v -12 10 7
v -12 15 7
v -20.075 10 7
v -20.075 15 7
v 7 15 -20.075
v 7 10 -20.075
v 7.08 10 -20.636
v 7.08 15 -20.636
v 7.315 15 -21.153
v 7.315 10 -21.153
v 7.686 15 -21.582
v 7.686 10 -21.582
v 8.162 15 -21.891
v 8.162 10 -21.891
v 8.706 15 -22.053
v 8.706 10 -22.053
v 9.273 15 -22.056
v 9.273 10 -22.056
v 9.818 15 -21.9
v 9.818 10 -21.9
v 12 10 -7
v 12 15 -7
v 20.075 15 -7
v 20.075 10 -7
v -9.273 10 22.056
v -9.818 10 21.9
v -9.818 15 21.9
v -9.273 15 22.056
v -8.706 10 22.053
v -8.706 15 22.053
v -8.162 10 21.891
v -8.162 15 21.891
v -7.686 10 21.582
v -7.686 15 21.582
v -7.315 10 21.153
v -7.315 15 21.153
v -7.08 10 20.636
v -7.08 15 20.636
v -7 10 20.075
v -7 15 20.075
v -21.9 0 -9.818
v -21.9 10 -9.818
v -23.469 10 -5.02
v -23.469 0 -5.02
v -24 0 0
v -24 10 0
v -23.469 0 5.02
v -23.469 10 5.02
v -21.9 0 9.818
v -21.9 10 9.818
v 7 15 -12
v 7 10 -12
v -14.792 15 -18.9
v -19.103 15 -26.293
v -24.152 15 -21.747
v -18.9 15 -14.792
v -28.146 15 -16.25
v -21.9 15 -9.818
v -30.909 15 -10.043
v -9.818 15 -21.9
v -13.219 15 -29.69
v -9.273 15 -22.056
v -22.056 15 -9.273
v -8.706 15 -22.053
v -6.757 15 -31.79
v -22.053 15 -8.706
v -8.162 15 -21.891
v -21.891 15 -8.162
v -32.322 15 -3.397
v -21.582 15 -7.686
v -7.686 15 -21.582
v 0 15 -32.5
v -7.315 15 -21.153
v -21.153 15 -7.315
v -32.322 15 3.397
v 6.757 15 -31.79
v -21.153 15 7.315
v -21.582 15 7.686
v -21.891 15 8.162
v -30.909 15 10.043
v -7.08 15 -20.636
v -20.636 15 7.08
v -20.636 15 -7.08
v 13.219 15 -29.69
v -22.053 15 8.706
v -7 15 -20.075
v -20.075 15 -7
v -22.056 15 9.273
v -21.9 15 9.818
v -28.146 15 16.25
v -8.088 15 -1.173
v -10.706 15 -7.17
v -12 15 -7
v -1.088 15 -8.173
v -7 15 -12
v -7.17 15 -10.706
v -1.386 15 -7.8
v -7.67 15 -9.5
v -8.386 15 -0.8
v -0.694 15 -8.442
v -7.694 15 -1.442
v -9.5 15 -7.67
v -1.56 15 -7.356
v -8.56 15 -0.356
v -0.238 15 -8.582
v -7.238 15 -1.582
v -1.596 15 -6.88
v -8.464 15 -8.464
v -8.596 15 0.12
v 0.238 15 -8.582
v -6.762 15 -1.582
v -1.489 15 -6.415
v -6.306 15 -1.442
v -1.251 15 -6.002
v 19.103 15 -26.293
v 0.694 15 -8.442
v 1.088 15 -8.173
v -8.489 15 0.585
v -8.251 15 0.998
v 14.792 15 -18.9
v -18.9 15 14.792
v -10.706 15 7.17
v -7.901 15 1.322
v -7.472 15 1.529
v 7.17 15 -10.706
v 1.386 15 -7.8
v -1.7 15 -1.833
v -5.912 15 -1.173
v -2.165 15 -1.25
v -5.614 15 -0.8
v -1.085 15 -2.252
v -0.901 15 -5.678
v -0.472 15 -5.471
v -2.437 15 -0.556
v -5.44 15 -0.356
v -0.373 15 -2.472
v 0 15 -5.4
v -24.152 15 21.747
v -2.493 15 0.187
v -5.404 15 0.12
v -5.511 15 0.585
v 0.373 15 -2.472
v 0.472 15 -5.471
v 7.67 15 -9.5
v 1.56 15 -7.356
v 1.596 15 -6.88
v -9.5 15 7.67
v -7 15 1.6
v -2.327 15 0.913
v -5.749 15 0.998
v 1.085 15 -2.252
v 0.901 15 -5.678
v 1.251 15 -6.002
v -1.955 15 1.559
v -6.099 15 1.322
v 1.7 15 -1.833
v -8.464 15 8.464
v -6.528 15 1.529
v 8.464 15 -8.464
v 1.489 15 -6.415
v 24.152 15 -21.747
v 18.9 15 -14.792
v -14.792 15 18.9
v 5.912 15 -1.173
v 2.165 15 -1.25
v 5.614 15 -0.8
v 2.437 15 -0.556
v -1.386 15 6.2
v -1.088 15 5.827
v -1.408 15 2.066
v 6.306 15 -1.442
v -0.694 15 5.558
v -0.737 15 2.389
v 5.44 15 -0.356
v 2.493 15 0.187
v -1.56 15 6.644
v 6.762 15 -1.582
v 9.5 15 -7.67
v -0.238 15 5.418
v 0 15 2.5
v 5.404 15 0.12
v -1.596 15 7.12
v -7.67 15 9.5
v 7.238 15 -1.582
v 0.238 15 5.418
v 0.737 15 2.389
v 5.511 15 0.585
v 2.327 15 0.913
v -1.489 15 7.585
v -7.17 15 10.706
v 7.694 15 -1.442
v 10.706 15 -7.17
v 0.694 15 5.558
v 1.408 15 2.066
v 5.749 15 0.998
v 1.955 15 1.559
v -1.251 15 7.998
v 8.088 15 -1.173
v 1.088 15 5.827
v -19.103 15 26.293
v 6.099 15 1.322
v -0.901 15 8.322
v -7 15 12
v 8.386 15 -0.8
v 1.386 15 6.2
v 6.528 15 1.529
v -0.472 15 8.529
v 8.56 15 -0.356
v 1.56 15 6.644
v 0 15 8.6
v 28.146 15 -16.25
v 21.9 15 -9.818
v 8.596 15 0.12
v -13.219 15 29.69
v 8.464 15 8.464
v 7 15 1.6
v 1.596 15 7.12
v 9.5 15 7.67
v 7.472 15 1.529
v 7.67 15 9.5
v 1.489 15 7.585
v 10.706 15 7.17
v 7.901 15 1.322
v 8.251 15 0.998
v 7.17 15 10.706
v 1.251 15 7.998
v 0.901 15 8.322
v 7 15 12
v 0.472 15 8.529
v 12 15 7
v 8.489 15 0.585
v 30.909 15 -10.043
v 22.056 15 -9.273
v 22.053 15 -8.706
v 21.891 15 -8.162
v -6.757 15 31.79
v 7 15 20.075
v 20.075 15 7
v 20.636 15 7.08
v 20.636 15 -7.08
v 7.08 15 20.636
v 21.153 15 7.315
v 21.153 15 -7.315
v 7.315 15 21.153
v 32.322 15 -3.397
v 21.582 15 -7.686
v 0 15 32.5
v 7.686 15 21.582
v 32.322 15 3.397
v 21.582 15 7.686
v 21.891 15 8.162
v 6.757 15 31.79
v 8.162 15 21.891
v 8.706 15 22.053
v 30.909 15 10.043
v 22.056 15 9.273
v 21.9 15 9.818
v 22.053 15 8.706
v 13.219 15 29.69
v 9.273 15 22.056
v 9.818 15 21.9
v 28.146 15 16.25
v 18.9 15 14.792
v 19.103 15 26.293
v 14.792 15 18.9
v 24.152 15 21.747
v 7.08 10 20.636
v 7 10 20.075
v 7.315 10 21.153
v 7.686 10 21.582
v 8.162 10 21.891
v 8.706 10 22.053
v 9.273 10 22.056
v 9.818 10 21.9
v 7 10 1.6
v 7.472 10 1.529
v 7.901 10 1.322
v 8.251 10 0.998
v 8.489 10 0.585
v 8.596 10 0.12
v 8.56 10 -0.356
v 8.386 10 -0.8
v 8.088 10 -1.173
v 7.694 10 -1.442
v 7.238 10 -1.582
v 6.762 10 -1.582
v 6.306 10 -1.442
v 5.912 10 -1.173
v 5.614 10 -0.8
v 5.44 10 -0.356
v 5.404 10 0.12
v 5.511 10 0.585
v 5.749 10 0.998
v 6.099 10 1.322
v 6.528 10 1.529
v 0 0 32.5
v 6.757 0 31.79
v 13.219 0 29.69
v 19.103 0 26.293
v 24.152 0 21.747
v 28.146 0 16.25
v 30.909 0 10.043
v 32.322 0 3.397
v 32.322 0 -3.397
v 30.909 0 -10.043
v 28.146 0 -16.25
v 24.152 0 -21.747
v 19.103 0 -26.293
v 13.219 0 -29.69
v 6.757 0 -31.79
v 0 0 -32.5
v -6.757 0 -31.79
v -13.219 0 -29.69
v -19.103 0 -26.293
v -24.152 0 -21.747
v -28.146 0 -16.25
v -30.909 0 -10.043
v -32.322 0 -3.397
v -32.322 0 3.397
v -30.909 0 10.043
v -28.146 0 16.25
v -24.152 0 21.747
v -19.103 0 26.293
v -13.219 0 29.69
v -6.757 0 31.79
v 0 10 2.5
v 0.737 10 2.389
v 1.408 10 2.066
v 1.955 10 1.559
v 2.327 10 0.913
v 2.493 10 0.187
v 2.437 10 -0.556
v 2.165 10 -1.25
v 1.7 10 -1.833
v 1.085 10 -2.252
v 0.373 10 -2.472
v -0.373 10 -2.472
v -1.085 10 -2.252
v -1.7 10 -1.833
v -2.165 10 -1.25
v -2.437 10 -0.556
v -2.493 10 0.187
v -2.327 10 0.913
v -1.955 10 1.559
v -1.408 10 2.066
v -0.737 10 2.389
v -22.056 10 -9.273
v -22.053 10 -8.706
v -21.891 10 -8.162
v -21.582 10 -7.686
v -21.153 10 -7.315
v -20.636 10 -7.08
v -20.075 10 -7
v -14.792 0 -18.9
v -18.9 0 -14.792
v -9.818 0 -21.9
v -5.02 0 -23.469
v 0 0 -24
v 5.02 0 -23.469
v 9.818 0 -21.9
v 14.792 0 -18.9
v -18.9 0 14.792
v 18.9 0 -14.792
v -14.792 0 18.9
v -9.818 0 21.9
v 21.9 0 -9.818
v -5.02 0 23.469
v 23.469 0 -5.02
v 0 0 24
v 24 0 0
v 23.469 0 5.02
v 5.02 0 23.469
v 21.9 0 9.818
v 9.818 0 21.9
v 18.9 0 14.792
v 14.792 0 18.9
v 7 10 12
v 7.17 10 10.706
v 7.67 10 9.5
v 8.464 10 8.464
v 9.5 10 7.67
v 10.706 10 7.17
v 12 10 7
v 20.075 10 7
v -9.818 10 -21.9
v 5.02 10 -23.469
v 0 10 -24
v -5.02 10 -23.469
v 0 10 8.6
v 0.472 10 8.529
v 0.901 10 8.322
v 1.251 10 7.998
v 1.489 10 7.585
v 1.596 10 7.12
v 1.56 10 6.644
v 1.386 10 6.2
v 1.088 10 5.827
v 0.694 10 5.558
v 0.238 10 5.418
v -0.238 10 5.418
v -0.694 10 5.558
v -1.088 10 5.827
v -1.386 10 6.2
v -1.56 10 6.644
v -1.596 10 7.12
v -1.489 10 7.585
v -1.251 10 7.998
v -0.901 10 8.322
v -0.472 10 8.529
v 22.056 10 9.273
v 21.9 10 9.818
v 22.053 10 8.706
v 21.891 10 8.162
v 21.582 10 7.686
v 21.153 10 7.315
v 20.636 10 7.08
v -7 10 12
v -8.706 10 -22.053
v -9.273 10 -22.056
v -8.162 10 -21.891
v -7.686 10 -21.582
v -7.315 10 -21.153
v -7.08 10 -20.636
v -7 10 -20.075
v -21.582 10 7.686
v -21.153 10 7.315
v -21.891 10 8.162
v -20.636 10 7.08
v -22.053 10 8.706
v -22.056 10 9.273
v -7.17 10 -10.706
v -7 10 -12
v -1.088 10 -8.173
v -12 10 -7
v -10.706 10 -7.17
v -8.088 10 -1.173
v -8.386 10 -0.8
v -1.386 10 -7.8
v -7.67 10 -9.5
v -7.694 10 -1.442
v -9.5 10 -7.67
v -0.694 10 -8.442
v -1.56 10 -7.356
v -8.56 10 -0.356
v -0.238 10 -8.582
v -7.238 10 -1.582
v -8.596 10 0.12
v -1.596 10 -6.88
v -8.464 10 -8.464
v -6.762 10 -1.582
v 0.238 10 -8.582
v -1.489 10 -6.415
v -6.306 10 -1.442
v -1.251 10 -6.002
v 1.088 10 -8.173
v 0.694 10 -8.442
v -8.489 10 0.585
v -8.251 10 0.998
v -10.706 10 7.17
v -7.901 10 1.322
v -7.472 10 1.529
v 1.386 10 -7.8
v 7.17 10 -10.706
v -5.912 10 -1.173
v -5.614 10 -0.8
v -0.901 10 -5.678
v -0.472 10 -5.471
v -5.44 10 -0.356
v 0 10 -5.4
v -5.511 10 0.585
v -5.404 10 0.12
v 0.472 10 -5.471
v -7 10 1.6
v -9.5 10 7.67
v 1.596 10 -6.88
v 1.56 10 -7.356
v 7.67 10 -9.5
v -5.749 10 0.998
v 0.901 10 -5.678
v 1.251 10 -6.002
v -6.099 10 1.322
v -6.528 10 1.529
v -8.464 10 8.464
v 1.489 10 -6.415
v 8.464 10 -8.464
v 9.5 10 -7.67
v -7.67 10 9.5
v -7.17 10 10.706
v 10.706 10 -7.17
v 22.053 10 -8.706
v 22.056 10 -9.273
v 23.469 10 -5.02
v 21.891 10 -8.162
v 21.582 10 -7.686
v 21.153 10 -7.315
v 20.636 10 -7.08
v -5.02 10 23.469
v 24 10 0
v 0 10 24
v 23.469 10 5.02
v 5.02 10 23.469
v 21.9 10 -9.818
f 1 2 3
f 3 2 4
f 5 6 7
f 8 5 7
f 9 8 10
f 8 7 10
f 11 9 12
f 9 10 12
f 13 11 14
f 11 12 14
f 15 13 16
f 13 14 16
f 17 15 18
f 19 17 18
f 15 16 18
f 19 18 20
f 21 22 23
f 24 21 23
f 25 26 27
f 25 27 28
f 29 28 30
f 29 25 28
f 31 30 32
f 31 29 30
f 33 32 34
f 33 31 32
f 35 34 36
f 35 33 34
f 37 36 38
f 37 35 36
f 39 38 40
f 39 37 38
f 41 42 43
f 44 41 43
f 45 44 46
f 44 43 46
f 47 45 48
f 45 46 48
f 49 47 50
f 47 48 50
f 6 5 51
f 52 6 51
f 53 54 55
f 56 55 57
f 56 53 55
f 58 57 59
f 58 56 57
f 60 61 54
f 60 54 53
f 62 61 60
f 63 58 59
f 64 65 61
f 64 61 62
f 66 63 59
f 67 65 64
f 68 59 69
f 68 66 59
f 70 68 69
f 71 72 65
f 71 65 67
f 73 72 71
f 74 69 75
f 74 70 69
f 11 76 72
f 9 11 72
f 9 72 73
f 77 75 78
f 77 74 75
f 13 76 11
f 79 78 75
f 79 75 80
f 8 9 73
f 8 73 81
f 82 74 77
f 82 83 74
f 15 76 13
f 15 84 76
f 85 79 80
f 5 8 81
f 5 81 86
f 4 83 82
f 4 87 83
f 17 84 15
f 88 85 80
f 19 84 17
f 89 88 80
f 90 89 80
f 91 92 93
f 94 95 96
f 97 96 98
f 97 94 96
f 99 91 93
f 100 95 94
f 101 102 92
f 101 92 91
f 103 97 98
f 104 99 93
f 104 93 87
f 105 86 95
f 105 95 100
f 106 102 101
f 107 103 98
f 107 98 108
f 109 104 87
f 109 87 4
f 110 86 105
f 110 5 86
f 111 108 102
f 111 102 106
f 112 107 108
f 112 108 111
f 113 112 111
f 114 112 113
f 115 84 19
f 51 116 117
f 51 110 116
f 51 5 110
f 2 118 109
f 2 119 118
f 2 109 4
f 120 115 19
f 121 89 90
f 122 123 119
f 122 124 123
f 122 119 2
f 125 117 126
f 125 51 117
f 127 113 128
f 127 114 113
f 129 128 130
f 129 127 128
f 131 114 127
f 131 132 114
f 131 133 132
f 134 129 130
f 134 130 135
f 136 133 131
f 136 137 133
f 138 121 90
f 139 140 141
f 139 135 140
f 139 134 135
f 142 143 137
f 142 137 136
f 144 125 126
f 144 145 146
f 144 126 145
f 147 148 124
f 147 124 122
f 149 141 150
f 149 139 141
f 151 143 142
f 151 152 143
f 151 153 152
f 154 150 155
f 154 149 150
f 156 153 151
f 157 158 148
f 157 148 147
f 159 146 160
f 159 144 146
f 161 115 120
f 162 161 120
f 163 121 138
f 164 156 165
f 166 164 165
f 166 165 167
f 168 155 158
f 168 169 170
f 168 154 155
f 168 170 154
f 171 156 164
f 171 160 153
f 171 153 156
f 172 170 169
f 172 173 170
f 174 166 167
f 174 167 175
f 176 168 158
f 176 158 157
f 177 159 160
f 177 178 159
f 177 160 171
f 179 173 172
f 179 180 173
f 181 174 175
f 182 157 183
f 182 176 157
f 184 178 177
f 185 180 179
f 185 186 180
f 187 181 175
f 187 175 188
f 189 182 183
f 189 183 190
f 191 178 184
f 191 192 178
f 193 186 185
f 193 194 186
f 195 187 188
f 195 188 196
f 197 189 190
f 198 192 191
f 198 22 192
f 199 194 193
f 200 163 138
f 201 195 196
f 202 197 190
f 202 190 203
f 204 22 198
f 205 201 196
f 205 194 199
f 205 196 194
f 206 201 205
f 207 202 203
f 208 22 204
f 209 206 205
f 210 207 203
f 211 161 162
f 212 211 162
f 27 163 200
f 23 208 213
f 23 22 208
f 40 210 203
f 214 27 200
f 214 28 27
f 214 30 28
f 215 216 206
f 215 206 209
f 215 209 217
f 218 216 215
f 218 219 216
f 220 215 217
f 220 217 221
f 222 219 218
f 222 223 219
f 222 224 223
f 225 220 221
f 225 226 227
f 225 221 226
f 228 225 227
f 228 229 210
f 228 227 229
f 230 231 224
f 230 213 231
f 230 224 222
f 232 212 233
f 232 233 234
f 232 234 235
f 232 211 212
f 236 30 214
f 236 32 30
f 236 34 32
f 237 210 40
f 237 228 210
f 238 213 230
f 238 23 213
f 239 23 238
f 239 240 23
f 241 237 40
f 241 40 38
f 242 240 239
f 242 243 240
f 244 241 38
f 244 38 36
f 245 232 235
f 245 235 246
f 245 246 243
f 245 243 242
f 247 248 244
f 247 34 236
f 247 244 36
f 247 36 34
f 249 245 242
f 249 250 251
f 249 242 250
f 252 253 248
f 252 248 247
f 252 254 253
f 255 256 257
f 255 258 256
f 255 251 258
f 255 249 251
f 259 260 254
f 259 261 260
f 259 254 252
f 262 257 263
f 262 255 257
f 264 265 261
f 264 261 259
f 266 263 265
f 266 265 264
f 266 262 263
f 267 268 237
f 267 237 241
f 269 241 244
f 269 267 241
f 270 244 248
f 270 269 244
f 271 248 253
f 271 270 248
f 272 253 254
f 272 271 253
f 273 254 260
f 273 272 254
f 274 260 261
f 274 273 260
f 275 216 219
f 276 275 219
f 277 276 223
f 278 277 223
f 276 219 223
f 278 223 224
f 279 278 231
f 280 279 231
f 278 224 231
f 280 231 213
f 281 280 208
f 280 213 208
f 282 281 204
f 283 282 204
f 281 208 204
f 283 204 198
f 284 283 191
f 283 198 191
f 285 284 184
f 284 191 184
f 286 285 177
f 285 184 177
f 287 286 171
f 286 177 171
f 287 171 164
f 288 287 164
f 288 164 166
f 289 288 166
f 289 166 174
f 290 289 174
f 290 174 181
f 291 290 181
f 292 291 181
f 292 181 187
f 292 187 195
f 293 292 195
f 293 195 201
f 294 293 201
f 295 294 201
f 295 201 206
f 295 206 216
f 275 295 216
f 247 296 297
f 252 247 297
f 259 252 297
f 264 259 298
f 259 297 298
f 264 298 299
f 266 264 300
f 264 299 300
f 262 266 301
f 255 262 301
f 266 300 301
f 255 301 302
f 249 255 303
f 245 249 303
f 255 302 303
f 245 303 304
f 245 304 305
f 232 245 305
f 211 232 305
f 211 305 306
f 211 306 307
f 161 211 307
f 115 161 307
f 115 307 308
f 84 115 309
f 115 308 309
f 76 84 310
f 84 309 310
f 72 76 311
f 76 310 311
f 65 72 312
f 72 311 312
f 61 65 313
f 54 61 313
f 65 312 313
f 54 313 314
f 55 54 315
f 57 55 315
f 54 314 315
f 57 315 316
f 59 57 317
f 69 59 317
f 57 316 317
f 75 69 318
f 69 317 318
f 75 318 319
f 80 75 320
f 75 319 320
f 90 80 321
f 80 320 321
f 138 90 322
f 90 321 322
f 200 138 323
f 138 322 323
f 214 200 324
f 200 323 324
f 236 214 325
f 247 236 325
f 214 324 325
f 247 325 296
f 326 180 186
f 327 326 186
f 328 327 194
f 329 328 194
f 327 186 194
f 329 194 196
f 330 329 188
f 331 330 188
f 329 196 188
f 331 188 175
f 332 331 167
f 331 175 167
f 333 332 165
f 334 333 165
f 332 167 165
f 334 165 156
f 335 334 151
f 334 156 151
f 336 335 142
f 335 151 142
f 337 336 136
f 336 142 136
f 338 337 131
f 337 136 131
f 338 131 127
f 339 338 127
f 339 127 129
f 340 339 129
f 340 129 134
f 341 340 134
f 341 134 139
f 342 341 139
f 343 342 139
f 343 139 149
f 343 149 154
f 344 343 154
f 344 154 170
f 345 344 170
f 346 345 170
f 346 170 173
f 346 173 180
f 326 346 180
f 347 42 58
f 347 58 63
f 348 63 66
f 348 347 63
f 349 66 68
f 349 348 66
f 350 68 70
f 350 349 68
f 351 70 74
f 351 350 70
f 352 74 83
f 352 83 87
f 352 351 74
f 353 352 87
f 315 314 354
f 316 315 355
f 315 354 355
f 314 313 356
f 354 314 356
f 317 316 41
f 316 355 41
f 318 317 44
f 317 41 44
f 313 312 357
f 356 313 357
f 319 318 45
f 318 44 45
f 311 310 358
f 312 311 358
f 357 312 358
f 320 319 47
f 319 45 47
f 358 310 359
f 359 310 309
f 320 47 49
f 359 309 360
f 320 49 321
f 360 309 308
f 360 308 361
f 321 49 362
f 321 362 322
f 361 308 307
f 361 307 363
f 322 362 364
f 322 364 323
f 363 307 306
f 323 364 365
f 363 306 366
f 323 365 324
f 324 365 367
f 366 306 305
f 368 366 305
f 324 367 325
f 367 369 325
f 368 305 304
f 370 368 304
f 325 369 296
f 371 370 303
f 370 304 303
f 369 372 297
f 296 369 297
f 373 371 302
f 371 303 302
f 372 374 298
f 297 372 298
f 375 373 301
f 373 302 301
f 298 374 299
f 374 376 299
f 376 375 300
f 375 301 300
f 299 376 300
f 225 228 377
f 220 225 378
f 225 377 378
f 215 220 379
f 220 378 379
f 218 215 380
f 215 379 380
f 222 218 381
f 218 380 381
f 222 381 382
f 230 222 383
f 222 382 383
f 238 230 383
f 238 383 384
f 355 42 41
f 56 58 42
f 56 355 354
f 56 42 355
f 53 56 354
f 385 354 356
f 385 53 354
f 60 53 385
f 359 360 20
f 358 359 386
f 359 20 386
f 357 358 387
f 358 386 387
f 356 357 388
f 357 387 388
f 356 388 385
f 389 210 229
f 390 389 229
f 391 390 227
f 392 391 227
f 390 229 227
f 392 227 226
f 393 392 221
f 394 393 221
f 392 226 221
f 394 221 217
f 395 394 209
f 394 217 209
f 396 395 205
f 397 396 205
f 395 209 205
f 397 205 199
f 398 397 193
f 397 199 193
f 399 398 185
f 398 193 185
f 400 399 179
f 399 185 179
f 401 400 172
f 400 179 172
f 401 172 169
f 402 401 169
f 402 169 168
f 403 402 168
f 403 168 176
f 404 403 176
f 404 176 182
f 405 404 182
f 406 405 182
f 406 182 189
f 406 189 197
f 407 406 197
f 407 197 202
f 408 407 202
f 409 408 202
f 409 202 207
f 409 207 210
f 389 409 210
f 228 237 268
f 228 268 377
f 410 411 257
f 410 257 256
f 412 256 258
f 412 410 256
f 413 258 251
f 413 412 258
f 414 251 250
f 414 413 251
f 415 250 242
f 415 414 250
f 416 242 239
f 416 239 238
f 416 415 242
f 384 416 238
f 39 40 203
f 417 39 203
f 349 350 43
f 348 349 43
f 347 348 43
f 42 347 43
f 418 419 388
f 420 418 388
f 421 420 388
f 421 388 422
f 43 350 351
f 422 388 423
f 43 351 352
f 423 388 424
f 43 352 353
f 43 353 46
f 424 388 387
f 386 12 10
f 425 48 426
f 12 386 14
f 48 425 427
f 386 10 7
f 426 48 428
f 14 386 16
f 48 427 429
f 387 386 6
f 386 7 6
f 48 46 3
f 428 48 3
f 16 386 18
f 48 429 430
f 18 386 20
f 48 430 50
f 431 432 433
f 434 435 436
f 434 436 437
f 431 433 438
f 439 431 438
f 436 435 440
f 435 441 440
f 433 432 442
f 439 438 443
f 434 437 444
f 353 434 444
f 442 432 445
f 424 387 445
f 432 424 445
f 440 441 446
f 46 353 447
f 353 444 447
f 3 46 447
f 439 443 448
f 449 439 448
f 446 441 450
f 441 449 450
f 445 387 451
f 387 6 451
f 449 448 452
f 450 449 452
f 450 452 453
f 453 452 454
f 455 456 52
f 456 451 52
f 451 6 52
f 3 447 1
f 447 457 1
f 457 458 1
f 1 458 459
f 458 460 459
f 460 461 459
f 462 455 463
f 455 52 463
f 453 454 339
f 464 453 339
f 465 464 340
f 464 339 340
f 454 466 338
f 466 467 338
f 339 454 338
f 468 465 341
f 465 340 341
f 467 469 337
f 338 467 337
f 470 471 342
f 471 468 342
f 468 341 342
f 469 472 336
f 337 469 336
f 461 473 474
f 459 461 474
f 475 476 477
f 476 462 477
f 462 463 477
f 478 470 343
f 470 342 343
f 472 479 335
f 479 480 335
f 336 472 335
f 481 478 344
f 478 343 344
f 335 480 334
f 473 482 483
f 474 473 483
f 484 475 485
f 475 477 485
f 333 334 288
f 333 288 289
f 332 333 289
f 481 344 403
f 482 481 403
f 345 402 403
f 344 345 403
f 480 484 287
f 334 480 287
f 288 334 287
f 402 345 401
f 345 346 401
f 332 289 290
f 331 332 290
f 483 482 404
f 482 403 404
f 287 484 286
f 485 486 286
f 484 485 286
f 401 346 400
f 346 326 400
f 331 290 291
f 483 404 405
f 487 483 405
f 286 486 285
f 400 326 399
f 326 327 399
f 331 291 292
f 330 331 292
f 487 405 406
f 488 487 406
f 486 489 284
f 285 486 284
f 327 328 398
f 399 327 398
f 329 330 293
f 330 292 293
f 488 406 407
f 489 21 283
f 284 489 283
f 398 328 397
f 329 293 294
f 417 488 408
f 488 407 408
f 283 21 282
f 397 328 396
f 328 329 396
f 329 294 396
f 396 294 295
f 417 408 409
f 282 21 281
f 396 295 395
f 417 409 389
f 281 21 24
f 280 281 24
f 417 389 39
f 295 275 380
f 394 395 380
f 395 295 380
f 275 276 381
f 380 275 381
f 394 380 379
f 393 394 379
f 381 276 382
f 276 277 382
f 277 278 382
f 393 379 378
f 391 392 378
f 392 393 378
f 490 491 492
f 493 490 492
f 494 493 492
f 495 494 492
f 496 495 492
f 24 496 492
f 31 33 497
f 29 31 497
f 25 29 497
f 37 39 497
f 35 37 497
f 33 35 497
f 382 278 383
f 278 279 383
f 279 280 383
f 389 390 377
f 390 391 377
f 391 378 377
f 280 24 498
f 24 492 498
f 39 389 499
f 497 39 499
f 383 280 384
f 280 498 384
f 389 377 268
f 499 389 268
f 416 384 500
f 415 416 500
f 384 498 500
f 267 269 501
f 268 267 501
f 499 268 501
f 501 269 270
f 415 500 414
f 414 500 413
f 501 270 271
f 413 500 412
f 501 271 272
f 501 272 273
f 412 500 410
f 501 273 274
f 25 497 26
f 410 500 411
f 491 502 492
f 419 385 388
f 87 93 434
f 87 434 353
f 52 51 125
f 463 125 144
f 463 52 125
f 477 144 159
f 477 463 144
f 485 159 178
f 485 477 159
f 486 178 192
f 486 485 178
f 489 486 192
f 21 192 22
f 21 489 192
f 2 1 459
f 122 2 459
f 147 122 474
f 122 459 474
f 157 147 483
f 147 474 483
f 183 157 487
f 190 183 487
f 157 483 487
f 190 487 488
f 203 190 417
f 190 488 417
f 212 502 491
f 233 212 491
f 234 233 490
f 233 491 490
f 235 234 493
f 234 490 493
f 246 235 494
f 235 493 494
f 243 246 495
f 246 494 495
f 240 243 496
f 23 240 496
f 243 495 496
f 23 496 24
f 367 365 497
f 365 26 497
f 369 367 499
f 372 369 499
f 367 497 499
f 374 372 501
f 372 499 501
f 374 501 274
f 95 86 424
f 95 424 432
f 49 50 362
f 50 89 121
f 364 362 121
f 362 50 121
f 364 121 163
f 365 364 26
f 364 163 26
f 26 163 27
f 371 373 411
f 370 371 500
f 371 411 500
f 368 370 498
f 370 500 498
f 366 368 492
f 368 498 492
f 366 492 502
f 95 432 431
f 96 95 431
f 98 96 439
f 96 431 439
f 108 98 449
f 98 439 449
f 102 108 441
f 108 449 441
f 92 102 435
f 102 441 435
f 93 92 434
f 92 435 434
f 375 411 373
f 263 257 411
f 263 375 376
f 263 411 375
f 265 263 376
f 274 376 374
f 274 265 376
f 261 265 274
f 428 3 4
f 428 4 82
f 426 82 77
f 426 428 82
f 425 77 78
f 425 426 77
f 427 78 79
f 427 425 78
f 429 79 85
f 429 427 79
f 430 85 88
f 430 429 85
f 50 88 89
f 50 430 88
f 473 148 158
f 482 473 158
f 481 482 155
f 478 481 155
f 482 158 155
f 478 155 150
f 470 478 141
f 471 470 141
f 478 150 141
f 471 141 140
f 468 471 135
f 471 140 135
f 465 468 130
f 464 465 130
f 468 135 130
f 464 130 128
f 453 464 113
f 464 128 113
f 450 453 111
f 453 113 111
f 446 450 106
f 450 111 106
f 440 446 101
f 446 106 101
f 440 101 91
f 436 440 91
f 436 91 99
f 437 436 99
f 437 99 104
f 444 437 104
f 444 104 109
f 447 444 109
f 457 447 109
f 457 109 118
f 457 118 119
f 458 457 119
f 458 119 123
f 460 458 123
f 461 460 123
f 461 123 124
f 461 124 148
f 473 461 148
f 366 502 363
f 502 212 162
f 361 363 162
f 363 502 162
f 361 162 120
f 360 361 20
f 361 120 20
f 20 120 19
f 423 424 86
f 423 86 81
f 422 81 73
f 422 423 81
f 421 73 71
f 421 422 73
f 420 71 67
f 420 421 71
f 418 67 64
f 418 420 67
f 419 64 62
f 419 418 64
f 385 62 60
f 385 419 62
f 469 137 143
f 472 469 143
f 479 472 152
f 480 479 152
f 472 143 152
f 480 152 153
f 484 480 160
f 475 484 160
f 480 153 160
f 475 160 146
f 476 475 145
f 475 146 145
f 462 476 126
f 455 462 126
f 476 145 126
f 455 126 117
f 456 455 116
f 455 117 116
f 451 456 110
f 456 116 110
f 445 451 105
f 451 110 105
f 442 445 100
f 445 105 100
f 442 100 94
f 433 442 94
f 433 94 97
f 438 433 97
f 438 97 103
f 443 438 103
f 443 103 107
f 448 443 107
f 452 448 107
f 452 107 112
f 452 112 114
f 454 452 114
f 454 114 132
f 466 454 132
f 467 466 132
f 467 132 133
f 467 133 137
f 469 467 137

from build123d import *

# Parameters (mm, degrees)
SKETCH_1_R          = 32.5
EXTRUDE_1_DEPTH     = 15
SKETCH_2_R          = 1.6
CUT_EXTRUDE_1_DEPTH = 27
CUT_EXTRUDE_2_DEPTH = 15
FILLET_1_R          = 5
FILLET_2_R          = 2
CUT_EXTRUDE_START   = 10
SKETCH_4_R          = 24
CUT_EXTRUDE_3_DEPTH = 10
SKETCH_5_R          = 2.5
CUT_EXTRUDE_4_DEPTH = 10


with BuildPart() as part:
    # 草图1 → 凸台-拉伸1 (new body)
    with BuildSketch(Plane(origin=(0, 0, 0), x_dir=(1, 0, 0), z_dir=(0, 1, 0))):
        with Locations(Location((0, 0, 0), (0, 0, 270))):
            Circle(SKETCH_1_R)
    extrude(amount=EXTRUDE_1_DEPTH)

    # 草图2 → 切除-拉伸1 (cut)
    with BuildSketch(Plane(origin=(0, 15, 0), x_dir=(1, 0, 0), z_dir=(0, 1, 0))):
        with Locations(Location((7, 0, 0), (0, 0, 270))):
            Circle(SKETCH_2_R)
        with Locations(Location((0, -7, 0), (0, 0, 270))):
            Circle(SKETCH_2_R)
        with Locations(Location((-7, 0, 0), (0, 0, 270))):
            Circle(SKETCH_2_R)
        with Locations(Location((0, 7, 0), (0, 0, 270))):
            Circle(SKETCH_2_R)
    extrude(amount=-CUT_EXTRUDE_1_DEPTH, mode=Mode.SUBTRACT)

    # 草图3 → 切除-拉伸2 (cut)
    with BuildSketch(Plane(origin=(0, 15, 0), x_dir=(1, 0, 0), z_dir=(0, 1, 0))):
        with BuildLine():
            Line((7, 22.956480566), (7, 7))
            Line((7, 7), (22.956480566, 7))
            ThreePointArc((22.956480566, 7), (16.970562748, 16.970562748), (7, 22.956480566))
        make_face()
        with BuildLine():
            Line((-7, 7), (-22.956480566, 7))
            ThreePointArc((-22.956480566, 7), (-16.970562748, 16.970562748), (-7, 22.956480566))
            Line((-7, 22.956480566), (-7, 7))
        make_face()
        with BuildLine():
            Line((7, -7), (22.956480566, -7))
            ThreePointArc((22.956480566, -7), (16.970562748, -16.970562748), (7, -22.956480566))
            Line((7, -22.956480566), (7, -7))
        make_face()
        with BuildLine():
            Line((-7, -7), (-22.956480566, -7))
            ThreePointArc((-22.956480566, -7), (-16.970562748, -16.970562748), (-7, -22.956480566))
            Line((-7, -22.956480566), (-7, -7))
        make_face()
    extrude(amount=-CUT_EXTRUDE_2_DEPTH, mode=Mode.SUBTRACT)

    # 圆角1
    fillet_1_edges = [part.edges().sort_by_distance(p)[0] for p in [
        (-7, 7.5, -7),
        (7, 7.5, 7),
        (-7, 7.5, 7),
        (7, 7.5, -7),
    ]]
    fillet(fillet_1_edges, radius=FILLET_1_R)

    # 圆角2
    fillet_2_edges = [part.edges().sort_by_distance(p)[0] for p in [
        (-7, 7.5, -22.956480566),
        (-22.956480566, 7.5, -7),
        (7, 7.5, 22.956480566),
        (22.956480566, 7.5, 7),
        (-7, 7.5, 22.956480566),
        (-22.956480566, 7.5, 7),
        (7, 7.5, -22.956480566),
        (22.956480566, 7.5, -7),
    ]]
    fillet(fillet_2_edges, radius=FILLET_2_R)

    # 草图4 → 切除-拉伸3 (cut)
    with BuildSketch(Plane(origin=(0, 0, 0), x_dir=(1, 0, 0), z_dir=(0, 1, 0)).offset(CUT_EXTRUDE_START)):
        with Locations(Location((0, 0, 0), (0, 0, 270))):
            Circle(SKETCH_4_R)
    extrude(amount=-CUT_EXTRUDE_3_DEPTH, mode=Mode.SUBTRACT)

    # 草图5 → 切除-拉伸4 (cut)
    with BuildSketch(Plane(origin=(0, 15, 0), x_dir=(1, 0, 0), z_dir=(0, 1, 0))):
        with Locations(Location((0, 0, 0), (0, 0, 270))):
            Circle(SKETCH_5_R)
    extrude(amount=-CUT_EXTRUDE_4_DEPTH, mode=Mode.SUBTRACT)


solid = part.part
